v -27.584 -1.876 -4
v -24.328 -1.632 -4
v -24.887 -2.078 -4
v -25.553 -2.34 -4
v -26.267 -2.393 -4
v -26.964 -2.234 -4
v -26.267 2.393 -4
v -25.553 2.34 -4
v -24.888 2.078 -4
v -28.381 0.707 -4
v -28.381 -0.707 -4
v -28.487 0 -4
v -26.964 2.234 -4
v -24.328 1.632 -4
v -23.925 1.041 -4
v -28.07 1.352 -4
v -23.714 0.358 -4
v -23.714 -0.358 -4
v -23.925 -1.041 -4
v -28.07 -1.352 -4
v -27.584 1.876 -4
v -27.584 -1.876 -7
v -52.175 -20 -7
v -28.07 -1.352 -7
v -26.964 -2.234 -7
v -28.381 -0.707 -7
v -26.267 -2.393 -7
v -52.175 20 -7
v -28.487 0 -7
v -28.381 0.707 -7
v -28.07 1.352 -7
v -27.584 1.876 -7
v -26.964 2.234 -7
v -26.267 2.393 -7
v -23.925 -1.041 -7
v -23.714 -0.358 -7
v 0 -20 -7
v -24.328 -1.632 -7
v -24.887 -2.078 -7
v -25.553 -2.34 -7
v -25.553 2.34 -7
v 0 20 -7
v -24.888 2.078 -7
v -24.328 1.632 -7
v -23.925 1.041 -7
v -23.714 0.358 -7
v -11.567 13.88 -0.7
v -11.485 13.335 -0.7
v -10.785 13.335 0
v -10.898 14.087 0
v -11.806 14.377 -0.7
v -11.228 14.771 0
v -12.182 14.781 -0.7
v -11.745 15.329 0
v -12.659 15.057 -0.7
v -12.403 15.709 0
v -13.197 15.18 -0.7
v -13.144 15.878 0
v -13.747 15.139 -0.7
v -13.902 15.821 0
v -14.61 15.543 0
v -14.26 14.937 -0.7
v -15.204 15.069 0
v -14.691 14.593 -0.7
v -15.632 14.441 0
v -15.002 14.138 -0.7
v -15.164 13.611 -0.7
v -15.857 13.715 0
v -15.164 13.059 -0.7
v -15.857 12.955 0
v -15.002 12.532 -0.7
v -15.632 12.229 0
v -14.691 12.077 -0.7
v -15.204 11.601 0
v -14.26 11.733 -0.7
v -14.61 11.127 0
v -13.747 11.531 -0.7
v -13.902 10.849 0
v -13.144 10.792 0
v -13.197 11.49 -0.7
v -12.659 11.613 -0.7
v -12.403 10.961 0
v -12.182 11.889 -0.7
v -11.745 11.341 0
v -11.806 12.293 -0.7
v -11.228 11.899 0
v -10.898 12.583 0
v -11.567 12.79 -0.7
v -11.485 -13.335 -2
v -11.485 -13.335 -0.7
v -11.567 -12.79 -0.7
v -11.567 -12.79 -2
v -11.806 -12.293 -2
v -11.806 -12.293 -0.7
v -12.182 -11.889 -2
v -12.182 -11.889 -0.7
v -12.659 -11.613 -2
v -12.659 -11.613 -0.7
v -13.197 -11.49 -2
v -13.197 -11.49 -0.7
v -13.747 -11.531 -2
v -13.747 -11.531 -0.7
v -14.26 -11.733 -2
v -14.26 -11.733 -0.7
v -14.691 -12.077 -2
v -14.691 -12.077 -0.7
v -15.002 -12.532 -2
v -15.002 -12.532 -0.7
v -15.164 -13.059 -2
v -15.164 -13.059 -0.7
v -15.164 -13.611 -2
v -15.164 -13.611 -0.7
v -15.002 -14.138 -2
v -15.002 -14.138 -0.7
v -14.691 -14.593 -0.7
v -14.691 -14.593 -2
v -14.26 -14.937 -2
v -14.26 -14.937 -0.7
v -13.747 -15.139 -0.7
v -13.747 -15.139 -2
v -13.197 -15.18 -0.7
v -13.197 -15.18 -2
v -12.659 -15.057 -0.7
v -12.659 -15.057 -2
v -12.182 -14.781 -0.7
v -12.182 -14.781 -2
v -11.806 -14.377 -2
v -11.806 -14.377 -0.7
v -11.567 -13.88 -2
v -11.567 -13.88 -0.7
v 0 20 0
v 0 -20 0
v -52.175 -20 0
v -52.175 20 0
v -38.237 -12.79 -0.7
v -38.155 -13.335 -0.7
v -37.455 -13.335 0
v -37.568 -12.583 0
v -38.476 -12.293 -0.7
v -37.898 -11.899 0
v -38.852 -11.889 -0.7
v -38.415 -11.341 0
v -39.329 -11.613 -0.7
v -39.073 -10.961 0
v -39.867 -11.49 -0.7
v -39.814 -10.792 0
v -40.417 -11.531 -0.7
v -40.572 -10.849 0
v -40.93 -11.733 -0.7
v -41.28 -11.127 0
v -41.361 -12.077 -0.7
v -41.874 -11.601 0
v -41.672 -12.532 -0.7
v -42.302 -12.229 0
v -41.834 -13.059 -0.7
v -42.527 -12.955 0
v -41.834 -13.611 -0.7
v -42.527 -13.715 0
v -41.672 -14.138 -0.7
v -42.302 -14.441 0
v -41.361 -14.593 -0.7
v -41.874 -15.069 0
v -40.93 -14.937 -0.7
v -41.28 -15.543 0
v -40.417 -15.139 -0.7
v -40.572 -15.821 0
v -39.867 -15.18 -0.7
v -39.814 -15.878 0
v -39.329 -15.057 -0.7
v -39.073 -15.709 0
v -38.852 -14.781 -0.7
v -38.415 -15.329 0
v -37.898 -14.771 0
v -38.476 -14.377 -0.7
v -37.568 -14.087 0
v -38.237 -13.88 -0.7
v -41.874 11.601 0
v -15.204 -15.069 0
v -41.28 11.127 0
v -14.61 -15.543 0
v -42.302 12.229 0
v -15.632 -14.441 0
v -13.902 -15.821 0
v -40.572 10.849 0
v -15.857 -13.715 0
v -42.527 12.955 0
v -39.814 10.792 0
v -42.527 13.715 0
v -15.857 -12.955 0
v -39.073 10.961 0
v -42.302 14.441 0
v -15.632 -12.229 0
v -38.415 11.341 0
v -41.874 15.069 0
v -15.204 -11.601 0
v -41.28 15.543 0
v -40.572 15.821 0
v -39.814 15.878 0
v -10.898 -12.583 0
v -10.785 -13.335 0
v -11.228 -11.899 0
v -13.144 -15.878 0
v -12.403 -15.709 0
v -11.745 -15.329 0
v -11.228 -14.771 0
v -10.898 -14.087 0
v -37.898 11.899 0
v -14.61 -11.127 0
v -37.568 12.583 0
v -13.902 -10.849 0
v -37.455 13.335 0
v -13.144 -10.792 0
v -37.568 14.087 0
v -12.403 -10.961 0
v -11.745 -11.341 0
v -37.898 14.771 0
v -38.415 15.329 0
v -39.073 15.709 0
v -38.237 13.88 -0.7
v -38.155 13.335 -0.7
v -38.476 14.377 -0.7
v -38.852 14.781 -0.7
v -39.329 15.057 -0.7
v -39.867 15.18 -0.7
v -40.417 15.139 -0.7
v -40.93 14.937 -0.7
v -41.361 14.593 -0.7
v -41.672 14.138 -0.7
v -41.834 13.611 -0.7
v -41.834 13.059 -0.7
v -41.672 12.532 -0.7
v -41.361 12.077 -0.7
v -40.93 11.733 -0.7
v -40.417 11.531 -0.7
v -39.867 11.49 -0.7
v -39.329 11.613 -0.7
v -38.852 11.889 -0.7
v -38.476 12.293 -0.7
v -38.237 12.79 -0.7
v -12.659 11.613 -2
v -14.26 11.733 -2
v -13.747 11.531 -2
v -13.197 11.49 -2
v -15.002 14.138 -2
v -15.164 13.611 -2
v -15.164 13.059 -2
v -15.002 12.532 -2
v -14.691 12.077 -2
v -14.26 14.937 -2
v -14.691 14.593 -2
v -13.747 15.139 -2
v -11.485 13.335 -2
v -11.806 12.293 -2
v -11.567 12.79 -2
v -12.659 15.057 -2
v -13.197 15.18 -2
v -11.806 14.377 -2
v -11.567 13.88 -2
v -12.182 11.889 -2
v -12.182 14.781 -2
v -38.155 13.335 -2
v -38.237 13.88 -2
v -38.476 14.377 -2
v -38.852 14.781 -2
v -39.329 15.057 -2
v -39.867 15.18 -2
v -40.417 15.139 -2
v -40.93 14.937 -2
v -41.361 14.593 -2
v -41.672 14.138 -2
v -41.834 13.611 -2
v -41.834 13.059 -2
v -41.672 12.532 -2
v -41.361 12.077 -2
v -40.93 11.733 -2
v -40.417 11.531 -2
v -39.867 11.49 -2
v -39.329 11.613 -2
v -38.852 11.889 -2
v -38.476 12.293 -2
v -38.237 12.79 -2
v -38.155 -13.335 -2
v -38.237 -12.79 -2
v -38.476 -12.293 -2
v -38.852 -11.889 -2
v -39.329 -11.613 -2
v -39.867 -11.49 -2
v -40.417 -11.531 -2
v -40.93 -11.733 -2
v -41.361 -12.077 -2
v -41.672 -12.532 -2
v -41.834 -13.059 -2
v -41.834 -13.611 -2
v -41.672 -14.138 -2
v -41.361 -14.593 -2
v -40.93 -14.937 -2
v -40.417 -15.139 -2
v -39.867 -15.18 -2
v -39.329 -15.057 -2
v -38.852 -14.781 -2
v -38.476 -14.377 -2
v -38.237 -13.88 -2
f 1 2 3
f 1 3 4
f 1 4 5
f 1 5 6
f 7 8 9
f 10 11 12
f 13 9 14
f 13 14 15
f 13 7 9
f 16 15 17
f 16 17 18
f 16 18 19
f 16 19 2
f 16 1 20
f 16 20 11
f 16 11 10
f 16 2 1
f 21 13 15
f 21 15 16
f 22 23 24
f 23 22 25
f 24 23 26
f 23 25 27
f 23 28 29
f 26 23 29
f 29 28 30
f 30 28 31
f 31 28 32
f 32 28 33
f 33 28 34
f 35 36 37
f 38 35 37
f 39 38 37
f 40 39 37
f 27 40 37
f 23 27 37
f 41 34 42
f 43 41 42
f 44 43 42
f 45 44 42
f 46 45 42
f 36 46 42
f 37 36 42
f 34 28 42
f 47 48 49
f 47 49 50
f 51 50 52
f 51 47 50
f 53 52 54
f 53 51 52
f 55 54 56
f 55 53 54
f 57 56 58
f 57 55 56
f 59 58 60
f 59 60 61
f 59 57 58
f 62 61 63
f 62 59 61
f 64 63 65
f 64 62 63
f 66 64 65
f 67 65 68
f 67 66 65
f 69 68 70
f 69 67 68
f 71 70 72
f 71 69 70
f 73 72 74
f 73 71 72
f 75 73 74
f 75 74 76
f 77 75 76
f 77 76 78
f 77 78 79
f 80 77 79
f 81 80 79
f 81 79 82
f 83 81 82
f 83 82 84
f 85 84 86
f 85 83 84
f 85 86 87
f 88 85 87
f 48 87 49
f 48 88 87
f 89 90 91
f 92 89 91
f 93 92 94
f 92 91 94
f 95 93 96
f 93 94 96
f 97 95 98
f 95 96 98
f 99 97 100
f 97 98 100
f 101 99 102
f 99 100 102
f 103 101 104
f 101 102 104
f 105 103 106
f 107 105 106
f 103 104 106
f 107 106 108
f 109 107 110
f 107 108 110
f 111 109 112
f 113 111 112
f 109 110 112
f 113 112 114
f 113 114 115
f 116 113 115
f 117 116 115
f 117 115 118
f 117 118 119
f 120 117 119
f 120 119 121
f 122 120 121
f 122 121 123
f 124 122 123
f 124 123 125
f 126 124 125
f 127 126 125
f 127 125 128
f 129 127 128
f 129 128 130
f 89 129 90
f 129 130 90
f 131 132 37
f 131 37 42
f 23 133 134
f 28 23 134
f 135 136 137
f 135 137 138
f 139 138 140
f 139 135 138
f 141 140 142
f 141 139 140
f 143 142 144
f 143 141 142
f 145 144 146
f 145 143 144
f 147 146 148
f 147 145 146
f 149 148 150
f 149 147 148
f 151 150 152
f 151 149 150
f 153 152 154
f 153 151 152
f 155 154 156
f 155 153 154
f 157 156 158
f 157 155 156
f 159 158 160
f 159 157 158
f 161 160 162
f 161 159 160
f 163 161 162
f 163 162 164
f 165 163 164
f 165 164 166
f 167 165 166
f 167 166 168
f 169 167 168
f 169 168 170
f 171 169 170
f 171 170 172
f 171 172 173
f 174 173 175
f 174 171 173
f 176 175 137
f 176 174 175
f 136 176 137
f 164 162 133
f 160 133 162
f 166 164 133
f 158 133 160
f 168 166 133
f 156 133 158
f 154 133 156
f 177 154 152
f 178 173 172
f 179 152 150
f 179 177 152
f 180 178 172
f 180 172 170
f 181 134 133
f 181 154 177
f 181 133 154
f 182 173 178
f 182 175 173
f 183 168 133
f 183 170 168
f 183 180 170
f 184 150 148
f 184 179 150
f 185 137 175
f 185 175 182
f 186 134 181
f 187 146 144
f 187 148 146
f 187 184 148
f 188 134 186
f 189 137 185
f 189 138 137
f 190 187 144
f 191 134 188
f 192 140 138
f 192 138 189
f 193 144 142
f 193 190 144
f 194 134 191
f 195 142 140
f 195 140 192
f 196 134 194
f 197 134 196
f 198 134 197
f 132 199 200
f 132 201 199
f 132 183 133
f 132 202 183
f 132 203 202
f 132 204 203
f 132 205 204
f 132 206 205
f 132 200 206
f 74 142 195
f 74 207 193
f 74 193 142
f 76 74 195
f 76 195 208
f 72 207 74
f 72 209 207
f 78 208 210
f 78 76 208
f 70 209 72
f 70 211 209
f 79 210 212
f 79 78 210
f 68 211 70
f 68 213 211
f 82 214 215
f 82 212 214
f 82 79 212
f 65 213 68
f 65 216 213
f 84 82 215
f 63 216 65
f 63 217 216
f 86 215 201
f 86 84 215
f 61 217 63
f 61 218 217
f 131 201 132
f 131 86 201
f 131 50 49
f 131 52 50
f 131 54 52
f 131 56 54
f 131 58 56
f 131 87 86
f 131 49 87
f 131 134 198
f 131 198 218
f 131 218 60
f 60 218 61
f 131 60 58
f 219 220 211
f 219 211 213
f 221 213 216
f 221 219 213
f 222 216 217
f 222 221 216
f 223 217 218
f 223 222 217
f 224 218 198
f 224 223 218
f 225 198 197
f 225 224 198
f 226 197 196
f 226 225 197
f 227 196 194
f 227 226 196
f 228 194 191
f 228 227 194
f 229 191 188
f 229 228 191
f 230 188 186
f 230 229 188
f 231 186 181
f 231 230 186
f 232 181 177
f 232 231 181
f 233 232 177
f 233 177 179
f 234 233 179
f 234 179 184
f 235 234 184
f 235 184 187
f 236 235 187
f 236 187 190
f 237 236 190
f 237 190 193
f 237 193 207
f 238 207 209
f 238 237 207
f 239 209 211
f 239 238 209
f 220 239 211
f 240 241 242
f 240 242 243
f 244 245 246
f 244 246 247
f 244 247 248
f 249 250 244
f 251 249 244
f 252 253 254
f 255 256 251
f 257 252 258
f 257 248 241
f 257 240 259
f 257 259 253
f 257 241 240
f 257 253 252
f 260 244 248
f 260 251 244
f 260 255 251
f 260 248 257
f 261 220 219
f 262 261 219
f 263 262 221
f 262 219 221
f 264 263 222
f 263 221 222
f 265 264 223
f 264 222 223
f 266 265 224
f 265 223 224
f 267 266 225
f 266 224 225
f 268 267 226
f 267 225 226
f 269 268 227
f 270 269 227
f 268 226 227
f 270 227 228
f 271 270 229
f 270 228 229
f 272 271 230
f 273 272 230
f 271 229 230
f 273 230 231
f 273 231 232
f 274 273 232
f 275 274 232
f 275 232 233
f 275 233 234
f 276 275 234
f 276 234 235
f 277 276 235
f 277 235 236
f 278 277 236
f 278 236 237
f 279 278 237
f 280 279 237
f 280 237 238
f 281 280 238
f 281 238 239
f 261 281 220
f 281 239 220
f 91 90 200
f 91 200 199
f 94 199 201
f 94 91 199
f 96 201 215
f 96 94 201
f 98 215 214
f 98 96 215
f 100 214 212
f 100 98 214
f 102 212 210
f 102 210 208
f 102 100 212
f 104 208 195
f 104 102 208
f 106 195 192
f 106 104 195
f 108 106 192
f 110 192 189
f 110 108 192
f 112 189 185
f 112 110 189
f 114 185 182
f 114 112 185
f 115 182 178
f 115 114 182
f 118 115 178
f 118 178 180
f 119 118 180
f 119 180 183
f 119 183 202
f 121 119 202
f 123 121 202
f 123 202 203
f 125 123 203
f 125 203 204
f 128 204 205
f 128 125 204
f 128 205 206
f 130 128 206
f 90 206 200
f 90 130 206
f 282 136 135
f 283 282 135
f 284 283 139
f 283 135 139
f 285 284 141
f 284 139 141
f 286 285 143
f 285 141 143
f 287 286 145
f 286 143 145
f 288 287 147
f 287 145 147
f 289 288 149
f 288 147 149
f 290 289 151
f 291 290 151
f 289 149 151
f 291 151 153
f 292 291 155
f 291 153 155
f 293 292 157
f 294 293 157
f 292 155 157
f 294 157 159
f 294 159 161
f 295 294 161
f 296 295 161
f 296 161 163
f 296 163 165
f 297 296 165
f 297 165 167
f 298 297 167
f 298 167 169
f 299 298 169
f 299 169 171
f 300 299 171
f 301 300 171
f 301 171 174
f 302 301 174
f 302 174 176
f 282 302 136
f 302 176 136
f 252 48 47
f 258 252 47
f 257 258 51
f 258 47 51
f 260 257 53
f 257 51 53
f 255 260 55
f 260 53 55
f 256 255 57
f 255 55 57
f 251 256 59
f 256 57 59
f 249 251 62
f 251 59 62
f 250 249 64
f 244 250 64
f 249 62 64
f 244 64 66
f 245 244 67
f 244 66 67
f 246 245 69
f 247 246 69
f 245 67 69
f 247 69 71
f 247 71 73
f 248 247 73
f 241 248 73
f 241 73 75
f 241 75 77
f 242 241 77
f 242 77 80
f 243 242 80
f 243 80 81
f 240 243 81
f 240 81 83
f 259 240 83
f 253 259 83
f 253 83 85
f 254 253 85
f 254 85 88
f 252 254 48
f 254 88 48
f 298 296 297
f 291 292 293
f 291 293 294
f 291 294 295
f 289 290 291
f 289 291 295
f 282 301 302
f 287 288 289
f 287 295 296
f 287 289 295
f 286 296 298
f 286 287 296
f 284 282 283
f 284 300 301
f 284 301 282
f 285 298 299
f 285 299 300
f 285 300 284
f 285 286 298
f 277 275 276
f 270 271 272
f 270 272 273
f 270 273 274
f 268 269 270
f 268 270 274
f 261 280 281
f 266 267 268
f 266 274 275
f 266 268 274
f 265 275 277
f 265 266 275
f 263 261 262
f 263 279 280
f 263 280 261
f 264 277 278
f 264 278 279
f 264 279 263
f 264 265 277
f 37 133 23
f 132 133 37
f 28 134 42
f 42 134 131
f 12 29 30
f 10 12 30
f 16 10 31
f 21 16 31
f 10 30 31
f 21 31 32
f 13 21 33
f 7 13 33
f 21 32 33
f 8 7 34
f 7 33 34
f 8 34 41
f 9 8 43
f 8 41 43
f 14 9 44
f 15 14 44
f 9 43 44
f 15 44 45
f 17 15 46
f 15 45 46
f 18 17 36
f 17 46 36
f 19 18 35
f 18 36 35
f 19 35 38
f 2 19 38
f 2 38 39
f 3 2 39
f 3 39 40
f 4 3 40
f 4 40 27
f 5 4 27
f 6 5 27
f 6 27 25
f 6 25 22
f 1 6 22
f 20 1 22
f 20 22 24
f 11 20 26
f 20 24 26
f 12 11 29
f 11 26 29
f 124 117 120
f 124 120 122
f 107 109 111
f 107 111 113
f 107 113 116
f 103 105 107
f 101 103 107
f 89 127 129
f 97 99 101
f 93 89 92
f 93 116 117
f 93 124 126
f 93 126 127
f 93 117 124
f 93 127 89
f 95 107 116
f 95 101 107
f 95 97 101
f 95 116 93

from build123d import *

# Parameters (mm, degrees)
SKETCH_W        = 52.175
SKETCH_H        = 40
PAD_DEPTH       = 7
SKETCH001_R     = 1.85
POCKET_DEPTH    = 2
SKETCH002_R     = 2.4
POCKET001_DEPTH = 3
CHAMFER_SIZE    = 0.7


with BuildPart() as part:
    # Sketch → Pad (new body)
    with BuildSketch(Plane.XY):
        with Locations((-26.0875, 0)):
            Rectangle(SKETCH_W, SKETCH_H)
    extrude(amount=-PAD_DEPTH)

    # Sketch001 → Pocket (cut)
    with BuildSketch(Plane.XY):
        with Locations((-40.005, 13.335)):
            Circle(SKETCH001_R)
        with Locations((-13.335, 13.335)):
            Circle(SKETCH001_R)
        with Locations((-40.005, -13.335)):
            Circle(SKETCH001_R)
        with Locations((-13.335, -13.335)):
            Circle(SKETCH001_R)
    extrude(amount=-POCKET_DEPTH, mode=Mode.SUBTRACT)

    # Sketch002 (on DatumPlane) → Pocket001 (cut)
    with BuildSketch(Plane(origin=(0, 0, -7), x_dir=(-1, 0, 0), z_dir=(0, 0, -1))):
        with Locations((26.0875, 0)):
            Circle(SKETCH002_R)
    extrude(amount=-POCKET001_DEPTH, mode=Mode.SUBTRACT)

    # Chamfer
    chamfer_edges = [part.edges().sort_by_distance(p)[0] for p in [
        (-15.185, -13.335, 0),
        (-41.855, -13.335, 0),
        (-41.855, 13.335, 0),
        (-15.185, 13.335, 0),
    ]]
    chamfer(chamfer_edges, length=CHAMFER_SIZE)


solid = part.part
